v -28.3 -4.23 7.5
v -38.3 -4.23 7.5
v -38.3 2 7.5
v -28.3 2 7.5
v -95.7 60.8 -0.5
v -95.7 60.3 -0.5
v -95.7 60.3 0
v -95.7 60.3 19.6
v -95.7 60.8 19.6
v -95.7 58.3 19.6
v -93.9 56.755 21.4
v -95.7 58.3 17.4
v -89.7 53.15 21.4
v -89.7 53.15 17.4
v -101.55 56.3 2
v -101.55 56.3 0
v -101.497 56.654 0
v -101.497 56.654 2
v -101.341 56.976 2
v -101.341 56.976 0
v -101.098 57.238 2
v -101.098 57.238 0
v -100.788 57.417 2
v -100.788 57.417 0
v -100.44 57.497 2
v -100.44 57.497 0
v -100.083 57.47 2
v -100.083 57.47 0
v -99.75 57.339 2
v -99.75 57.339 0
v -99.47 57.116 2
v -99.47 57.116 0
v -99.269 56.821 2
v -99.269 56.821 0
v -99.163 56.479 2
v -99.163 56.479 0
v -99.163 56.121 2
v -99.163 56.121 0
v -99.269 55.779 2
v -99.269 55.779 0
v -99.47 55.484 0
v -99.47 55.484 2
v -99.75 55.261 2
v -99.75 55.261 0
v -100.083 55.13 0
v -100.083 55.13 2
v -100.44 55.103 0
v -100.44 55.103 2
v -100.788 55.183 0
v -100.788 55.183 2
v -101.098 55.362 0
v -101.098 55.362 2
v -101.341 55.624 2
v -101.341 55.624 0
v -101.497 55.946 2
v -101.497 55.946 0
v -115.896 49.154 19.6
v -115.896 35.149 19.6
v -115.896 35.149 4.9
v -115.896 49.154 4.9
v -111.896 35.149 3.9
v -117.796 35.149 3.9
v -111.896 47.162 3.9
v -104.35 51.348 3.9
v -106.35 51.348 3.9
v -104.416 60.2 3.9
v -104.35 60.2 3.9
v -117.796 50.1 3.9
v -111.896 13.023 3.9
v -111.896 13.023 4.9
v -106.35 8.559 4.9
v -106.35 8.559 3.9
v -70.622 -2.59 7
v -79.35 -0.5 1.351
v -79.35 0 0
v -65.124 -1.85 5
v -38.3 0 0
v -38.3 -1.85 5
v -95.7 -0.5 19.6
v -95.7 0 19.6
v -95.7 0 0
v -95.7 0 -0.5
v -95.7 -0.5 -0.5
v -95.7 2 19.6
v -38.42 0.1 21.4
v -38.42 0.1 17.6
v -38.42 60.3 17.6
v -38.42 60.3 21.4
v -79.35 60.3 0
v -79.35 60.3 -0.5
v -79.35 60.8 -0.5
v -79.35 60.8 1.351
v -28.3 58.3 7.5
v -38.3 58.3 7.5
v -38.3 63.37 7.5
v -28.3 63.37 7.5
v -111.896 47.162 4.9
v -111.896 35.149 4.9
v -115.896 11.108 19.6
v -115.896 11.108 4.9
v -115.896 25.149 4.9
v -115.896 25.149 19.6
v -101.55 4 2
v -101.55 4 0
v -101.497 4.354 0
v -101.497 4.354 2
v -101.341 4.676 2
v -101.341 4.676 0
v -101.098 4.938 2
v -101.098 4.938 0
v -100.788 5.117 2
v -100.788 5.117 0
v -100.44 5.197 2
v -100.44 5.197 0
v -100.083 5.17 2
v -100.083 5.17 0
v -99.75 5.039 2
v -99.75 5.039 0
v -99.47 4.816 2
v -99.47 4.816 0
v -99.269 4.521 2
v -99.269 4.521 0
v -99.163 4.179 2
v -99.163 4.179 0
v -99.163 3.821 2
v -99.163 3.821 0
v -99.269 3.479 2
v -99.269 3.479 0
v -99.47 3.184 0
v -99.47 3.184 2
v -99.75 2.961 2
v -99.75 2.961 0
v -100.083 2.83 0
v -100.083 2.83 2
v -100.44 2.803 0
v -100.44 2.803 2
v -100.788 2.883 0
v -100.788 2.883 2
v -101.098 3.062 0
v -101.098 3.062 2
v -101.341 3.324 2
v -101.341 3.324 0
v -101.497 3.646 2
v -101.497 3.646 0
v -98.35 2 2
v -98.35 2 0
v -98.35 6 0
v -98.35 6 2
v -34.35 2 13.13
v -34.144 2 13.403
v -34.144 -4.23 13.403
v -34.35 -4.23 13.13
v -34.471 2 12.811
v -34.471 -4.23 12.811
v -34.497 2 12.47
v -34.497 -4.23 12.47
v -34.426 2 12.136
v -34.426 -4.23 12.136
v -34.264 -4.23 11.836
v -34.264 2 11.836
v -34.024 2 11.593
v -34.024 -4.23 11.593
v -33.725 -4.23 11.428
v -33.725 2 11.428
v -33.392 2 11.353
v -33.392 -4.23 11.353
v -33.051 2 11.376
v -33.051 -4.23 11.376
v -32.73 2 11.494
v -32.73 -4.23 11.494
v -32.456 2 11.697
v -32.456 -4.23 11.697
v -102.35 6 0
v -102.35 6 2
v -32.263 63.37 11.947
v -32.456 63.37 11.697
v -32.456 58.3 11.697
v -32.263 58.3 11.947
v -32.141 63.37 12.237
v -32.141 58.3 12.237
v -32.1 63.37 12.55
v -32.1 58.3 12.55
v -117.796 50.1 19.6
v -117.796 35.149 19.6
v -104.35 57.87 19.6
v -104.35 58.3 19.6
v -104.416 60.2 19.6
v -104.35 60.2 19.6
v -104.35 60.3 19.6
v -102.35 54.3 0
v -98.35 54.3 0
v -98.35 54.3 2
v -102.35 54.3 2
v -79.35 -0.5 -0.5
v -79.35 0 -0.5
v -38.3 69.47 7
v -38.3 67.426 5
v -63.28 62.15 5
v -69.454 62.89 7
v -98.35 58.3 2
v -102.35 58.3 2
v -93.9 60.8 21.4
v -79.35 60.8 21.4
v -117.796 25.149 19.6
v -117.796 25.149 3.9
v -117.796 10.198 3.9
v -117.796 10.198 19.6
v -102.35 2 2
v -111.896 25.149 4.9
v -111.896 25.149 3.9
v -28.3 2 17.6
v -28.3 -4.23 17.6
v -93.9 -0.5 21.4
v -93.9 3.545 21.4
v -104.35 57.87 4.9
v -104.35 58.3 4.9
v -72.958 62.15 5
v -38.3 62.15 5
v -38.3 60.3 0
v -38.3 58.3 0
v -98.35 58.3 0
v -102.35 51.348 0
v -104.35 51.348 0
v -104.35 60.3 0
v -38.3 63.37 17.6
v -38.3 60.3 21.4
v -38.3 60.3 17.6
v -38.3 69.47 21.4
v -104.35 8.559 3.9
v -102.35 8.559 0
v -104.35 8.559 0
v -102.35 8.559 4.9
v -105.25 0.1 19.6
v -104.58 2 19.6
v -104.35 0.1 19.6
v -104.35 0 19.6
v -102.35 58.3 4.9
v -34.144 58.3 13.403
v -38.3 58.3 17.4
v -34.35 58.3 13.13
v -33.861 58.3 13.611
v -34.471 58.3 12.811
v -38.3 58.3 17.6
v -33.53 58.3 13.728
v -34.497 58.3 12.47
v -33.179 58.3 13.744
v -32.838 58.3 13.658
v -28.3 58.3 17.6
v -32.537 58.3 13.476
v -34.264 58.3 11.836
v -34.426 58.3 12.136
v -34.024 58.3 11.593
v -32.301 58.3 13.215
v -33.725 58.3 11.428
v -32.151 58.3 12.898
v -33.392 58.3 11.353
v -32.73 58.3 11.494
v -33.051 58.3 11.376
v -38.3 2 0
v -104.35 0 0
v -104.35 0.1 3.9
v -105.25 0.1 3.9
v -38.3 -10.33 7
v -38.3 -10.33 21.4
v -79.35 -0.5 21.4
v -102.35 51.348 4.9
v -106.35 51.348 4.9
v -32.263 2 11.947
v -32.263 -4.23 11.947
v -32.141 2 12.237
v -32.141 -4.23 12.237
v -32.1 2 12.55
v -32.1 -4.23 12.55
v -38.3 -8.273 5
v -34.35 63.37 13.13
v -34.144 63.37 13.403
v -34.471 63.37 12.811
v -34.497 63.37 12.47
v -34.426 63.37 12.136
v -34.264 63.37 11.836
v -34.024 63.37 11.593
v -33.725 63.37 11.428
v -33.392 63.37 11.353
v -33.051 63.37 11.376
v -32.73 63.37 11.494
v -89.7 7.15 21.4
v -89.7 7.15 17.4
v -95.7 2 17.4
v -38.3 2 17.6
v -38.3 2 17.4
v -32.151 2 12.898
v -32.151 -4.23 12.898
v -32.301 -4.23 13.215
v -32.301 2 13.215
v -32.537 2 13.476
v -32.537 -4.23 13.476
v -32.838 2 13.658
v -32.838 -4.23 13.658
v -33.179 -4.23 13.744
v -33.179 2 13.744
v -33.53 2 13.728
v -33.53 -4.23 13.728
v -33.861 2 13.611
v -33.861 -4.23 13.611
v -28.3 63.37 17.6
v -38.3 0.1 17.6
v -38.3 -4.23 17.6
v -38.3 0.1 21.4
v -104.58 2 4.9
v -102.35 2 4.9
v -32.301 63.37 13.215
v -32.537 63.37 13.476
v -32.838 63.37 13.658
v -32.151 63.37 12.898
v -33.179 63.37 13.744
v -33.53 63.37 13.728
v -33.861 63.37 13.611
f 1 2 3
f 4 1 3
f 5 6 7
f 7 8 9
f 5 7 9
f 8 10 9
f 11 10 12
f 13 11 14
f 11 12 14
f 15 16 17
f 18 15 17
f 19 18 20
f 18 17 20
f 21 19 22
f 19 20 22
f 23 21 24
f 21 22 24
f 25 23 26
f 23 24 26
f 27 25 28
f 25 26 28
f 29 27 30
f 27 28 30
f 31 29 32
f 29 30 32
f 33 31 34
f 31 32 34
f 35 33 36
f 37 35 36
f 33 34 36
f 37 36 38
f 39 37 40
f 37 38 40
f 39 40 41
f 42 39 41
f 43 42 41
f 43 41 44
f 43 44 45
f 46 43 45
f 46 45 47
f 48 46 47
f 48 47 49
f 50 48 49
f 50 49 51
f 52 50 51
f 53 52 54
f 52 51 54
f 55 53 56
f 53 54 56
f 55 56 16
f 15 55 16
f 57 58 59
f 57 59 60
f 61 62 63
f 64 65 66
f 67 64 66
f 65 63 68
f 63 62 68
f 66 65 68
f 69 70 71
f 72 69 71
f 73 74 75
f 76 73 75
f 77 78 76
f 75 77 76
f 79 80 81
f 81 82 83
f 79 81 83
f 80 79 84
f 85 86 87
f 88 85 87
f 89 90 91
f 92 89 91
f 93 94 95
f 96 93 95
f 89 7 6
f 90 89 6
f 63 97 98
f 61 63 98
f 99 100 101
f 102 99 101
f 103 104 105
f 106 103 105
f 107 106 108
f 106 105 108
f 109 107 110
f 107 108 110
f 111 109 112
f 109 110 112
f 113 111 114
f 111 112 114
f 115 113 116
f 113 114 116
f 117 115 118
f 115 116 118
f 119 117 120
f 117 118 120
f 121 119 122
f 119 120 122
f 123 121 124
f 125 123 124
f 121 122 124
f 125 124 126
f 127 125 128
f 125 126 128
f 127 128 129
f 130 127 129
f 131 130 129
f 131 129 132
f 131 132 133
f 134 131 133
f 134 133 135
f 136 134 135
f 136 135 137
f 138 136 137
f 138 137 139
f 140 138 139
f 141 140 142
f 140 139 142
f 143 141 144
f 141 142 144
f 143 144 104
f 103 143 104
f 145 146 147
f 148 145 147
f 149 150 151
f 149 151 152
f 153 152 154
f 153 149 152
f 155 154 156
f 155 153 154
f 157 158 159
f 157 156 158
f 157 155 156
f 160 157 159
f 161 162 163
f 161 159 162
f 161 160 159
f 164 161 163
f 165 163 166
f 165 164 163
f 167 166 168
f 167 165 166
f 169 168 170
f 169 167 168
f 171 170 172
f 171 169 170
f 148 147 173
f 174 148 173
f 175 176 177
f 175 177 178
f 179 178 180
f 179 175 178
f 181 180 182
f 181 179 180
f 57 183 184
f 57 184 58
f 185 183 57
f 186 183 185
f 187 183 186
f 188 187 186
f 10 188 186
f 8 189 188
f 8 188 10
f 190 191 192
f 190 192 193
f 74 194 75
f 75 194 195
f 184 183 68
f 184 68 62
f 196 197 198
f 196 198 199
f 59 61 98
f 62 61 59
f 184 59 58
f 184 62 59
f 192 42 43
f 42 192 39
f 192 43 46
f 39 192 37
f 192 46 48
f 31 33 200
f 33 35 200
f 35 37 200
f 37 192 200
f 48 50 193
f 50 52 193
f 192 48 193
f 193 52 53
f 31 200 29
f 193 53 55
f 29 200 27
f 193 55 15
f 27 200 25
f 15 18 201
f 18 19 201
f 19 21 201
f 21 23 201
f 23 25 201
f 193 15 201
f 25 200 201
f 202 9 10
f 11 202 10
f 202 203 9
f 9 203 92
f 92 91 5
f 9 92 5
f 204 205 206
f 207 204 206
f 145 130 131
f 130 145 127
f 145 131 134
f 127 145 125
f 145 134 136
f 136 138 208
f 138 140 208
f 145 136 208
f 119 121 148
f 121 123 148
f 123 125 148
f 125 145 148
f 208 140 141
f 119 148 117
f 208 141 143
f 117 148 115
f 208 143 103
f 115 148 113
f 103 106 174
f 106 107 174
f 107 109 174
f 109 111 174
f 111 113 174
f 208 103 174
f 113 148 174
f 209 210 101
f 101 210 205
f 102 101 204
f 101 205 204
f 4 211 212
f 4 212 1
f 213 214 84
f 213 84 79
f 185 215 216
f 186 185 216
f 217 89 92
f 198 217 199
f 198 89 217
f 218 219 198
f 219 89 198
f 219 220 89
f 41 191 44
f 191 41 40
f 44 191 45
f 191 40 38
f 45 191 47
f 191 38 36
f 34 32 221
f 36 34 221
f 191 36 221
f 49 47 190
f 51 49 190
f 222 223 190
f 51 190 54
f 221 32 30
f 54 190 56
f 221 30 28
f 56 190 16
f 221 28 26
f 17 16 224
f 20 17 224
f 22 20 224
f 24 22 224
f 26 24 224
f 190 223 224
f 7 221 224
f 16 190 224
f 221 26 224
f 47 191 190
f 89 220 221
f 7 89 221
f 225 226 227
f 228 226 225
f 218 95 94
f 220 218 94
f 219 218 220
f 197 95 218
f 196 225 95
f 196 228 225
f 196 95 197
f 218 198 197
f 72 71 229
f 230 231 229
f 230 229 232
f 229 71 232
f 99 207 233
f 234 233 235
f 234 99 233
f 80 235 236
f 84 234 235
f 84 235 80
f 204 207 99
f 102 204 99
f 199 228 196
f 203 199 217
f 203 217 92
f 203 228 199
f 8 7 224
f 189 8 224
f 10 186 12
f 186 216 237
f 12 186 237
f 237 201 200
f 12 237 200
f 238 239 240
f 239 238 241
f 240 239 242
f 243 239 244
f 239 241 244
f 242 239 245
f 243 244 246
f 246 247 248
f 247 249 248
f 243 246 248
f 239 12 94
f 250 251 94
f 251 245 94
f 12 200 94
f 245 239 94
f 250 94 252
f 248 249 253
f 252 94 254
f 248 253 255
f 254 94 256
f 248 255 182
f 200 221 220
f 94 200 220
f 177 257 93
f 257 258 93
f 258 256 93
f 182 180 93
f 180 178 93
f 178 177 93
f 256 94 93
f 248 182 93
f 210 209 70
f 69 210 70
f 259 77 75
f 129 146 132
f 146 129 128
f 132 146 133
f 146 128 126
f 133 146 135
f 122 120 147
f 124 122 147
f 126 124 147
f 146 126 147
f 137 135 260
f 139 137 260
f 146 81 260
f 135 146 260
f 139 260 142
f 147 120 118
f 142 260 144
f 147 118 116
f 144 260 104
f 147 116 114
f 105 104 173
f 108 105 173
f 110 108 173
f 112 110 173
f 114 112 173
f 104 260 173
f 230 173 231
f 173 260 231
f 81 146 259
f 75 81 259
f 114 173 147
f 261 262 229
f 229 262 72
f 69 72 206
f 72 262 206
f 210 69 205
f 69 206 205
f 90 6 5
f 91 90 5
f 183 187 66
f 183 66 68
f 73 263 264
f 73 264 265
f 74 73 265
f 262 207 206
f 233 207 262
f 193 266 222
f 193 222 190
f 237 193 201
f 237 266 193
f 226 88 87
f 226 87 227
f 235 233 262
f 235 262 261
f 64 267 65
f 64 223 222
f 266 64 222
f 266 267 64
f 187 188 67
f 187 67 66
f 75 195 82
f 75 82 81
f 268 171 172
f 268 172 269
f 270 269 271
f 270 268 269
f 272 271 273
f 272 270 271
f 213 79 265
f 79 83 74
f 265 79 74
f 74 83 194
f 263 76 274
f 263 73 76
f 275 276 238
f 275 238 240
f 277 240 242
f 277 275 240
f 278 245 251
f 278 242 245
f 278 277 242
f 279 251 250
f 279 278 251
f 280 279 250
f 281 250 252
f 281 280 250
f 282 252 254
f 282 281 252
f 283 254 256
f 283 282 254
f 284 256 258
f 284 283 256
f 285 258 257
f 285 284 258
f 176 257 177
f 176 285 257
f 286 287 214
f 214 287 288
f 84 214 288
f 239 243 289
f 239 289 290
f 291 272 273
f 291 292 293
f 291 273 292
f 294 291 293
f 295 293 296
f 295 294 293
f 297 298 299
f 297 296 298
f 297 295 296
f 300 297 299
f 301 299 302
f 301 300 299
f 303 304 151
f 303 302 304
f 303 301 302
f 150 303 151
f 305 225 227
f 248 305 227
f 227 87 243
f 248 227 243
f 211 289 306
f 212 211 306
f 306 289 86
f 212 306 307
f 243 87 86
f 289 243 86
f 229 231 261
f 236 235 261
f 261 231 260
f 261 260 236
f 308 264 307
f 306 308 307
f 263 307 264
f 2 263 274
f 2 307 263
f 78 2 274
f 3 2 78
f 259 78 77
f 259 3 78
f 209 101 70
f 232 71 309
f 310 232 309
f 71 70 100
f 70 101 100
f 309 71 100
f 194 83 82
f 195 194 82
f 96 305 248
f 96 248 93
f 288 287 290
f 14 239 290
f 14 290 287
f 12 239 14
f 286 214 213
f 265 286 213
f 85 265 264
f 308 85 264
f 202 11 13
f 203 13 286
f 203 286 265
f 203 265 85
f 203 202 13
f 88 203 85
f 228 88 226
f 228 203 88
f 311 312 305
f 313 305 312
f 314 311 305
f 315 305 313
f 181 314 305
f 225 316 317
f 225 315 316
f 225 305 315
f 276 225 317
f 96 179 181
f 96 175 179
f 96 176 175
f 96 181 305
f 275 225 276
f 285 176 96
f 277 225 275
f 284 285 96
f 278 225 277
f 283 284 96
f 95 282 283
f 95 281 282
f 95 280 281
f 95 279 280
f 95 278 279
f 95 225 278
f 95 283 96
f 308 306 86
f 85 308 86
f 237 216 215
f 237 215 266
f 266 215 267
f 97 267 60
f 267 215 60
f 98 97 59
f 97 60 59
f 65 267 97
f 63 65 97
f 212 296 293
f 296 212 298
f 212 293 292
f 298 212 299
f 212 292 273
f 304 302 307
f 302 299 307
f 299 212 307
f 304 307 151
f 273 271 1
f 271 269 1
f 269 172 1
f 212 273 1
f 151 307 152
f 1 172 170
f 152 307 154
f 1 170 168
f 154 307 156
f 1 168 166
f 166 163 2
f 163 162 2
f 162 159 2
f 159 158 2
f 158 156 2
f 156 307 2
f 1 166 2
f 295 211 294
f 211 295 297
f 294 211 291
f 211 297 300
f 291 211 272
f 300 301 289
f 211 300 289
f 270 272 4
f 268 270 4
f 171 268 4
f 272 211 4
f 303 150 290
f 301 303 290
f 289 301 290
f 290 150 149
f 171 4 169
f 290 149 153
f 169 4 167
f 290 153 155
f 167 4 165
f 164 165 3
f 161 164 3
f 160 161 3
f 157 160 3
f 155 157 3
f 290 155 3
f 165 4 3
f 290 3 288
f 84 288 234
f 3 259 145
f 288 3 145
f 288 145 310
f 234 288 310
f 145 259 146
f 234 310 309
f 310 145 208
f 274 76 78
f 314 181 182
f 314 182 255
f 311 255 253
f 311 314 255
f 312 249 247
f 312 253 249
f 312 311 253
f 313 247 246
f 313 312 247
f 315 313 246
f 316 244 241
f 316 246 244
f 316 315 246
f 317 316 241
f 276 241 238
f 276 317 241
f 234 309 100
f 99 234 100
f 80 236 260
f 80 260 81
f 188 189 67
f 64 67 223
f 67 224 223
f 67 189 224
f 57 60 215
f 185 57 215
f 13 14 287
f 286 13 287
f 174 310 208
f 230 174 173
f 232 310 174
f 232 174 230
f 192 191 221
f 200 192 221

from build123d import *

# Parameters (mm, degrees)
SKETCH_2_W               = 25
SKETCH_2_H               = 2
EXTRUDE_1_DEPTH          = 15
EXTRUDE_1_2_DEPTH        = 15
EXTRUDE_2_DEPTH          = 2.6
EXTRUDE_3_DEPTH          = 15.7
EXTRUDE_4_DEPTH          = 1
EXTRUDE_5_DEPTH          = 2
SKETCH_7_W               = 2
SKETCH_7_H               = 56.3
EXTRUDE_6_DEPTH          = 3.9
SKETCH_8_W               = 4
SKETCH_8_H               = 4
SKETCH_8_R               = 1.2
EXTRUDE_7_DEPTH          = 2
EXTRUDE_START            = -16.35
EXTRUDE_8_DEPTH          = 16.35
CUT_EXTRUDE_1_DEPTH      = 2.6
EXTRUDE_9_DEPTH          = 41.05
SKETCH_12_W              = 10.1
SKETCH_12_H              = 3.07
EXTRUDE_10_DEPTH         = 10
CUT_EXTRUDE_2_DEPTH      = 135.796311397
CUT_EXTRUDE_2_DEPTH_BACK = 135.796311397
EXTRUDE_11_DEPTH         = 3.8
SKETCH_15_W              = 8.65
SKETCH_15_H              = 2
CUT_EXTRUDE_3_DEPTH      = 1.8
CUT_EXTRUDE_4_DEPTH      = 2.4
EXTRUDE_12_DEPTH         = 16.399999999
EXTRUDE_13_REACH         = 109.72
EXTRUDE_14_REACH         = 109.72
CHAMFER_1_SIZE           = 2
CHAMFER_3_SIZE           = 1.8
SKETCH_20_W              = 4
SKETCH_20_H              = 42.789151816
CUT_EXTRUDE_5_DEPTH      = 10
SKETCH_21_W              = 15.7
SKETCH_21_H              = 10
CUT_EXTRUDE_6_DEPTH      = 10


with BuildPart() as part:
    # 草图2 → 凸台-拉伸1 (new body)
    with BuildSketch(Plane.XY):
        with Locations((-91.85, 1)):
            Rectangle(SKETCH_2_W, SKETCH_2_H)
    extrude(amount=EXTRUDE_1_DEPTH)



with BuildPart() as body_2:
    # 草图2 → Extrude 1 2 (new body)
    with BuildSketch(Plane.XY):
        with Locations((-91.85, 59.3)):
            Rectangle(SKETCH_2_W, SKETCH_2_H)
    extrude(amount=EXTRUDE_1_2_DEPTH)


with BuildPart() as part_1:
    add(part.part)

    add(body_2.part)  # 凸台-拉伸2 merges body 2
    # 草图3 → 凸台-拉伸2 (add)
    with BuildSketch(Plane.XY.offset(15)):
        Polygon((-95.7, 2), (-104.35, 2), (-104.35, 0), (-79.35, 0), (-79.35, 60.3), (-104.35, 60.3), (-104.35, 58.3), (-95.7, 58.3), align=None)
    extrude(amount=EXTRUDE_2_DEPTH)

    # 草图4 → 凸台-拉伸3 (add)
    with BuildSketch(Plane.XY.offset(19.6)):
        Polygon((-104.35, 2), (-104.580416833, 2), (-115.895945033, 11.107600771), (-115.895945033, 49.153887402), (-104.35, 57.869625998), (-104.35, 58.3), (-104.35, 60.2), (-104.416493669, 60.2), (-117.795945033, 50.10019437), (-117.795945033, 10.197880039), (-105.250067231, 0.1), (-104.35, 0.1), align=None)
    extrude(amount=-EXTRUDE_3_DEPTH)

    # 草图5 → 凸台-拉伸4 (add)
    with BuildSketch(Plane(origin=(0, 0, 3.9), x_dir=(-1, 0, 0), z_dir=(0, 0, -1))):
        Polygon((104.35, 2), (104.35, 57.869625998), (115.895945033, 49.153887402), (115.895945033, 11.107600771), (104.580416833, 2), align=None)
    extrude(amount=-EXTRUDE_4_DEPTH)

    # 草图6 → 凸台-拉伸5 (add)
    with BuildSketch(Plane(origin=(-104.35, 0, 0), x_dir=(0, 0, -1), z_dir=(1, 0, 0))):
        Polygon((-4.9, 58.3), (-4.9, 57.869625998), (-4.9, 2), (-3.9, 2), (-3.9, 58.3), align=None)
    extrude(amount=EXTRUDE_5_DEPTH)

    # 草图7 → 凸台-拉伸6 (add)
    with BuildSketch(Plane(origin=(0, 0, 3.9), x_dir=(-1, 0, 0), z_dir=(0, 0, -1))):
        with Locations((103.35, 30.15)):
            Rectangle(SKETCH_7_W, SKETCH_7_H)
    extrude(amount=EXTRUDE_6_DEPTH)

    # 草图8 → 凸台-拉伸7 (add)
    # profile 1 of 2: a face of its own
    with BuildSketch(Plane(origin=(0, 0, 0), x_dir=(-1, 0, 0), z_dir=(0, 0, -1))):
        with Locations((100.35, 56.3)):
            Rectangle(SKETCH_8_W, SKETCH_8_H)
        with Locations((100.35, 56.3)):
            Circle(SKETCH_8_R, mode=Mode.SUBTRACT)
    # profile 2 of 2: a face of its own
    with BuildSketch(Plane(origin=(0, 0, 0), x_dir=(-1, 0, 0), z_dir=(0, 0, -1))):
        with Locations((100.35, 4)):
            Rectangle(SKETCH_8_W, SKETCH_8_H)
        with Locations((100.35, 4)):
            Circle(SKETCH_8_R, mode=Mode.SUBTRACT)
    extrude(amount=-EXTRUDE_7_DEPTH)

    # 草图9 → 凸台-拉伸8 (add)
    with BuildSketch(Plane(origin=(-79.35, 0, 0), x_dir=(0, 0, -1), z_dir=(1, 0, 0)).offset(EXTRUDE_START)):
        Polygon((-17.6, 0), (-17.6, -0.5), (0.5, -0.5), (0.5, 0), (0, 0), align=None)
        Polygon((-17.6, 60.8), (-17.6, 60.3), (0, 60.3), (0.5, 60.3), (0.5, 60.8), align=None)
    extrude(amount=EXTRUDE_8_DEPTH)

    # 草图10 → 切除-拉伸1 (cut)
    with BuildSketch(Plane.XY.offset(17.6)):
        Polygon((-95.7, 58.3), (-89.7, 53.15), (-89.7, 7.15), (-95.7, 2), align=None)
    extrude(amount=-CUT_EXTRUDE_1_DEPTH, mode=Mode.SUBTRACT)

    # 草图11 → 凸台-拉伸9 (add)
    with BuildSketch(Plane(origin=(-79.35, 0, 0), x_dir=(0, 0, -1), z_dir=(1, 0, 0))):
        Polygon((-17.6, 0.1), (0, 0), (0, 2), (-15, 2), (-15, 58.3), (0, 58.3), (0, 60.3), (-17.6, 60.3), align=None)
    extrude(amount=EXTRUDE_9_DEPTH)

    # 草图12 → 凸台-拉伸10 (add)
    with BuildSketch(Plane(origin=(-38.3, 0, 0), x_dir=(0, 0, -1), z_dir=(1, 0, 0))):
        Polygon((-7.5, 0.042613636), (-7.5, 2), (-15, 2), (-17.6, 2), (-17.6, 0.1), align=None)
        Polygon((-7.5, -4.23), (-7.5, 0.042613636), (-17.6, 0.1), (-17.6, -4.23), align=None)
        with Locations((-12.55, 61.835)):
            Rectangle(SKETCH_12_W, SKETCH_12_H)
        Polygon((-15, 58.3), (-7.5, 58.3), (-7.5, 60.3), (-17.6, 60.3), (-17.6, 58.3), align=None)
    extrude(amount=EXTRUDE_10_DEPTH)

    # 草图13 → 切除-拉伸2 (cut, two sides: drawn at the far end of the back side and taken through both)
    with BuildSketch(Plane.XZ.offset(-58.3).offset(-CUT_EXTRUDE_2_DEPTH_BACK)):
        with BuildLine():
            ThreePointArc((-32.1, 12.55), (-32.838023478, 13.657509681), (-34.144296155, 13.402739117))
            Line((-34.144296155, 13.402739117), (-32.455703844, 11.697260883))
            ThreePointArc((-32.455703844, 11.697260883), (-32.192490319, 12.088023478), (-32.1, 12.55))
        make_face()
        with BuildLine():
            Line((-32.455703844, 11.697260883), (-34.144296155, 13.402739117))
            ThreePointArc((-34.144296155, 13.402739117), (-34.152739117, 11.705703844), (-32.455703844, 11.697260883))
        make_face()
    extrude(amount=CUT_EXTRUDE_2_DEPTH + CUT_EXTRUDE_2_DEPTH_BACK, mode=Mode.SUBTRACT)

    # 草图14 → 凸台-拉伸11 (add)
    with BuildSketch(Plane.XY.offset(17.6)):
        Polygon((-79.35, 0.1), (-38.42, 0.1), (-38.42, 2), (-38.42, 58.3), (-38.42, 60.3), (-79.35, 60.3), (-79.35, 60.8), (-95.7, 60.8), (-95.7, 60.3), (-104.35, 60.3), (-104.35, 60.2), (-104.35, 58.3), (-95.7, 58.3), (-89.7, 53.15), (-89.7, 7.15), (-95.7, 2), (-104.35, 2), (-104.35, 0.1), (-104.35, 0), (-95.7, 0), (-95.7, -0.5), (-79.35, -0.5), align=None)
    extrude(amount=EXTRUDE_11_DEPTH)

    # 草图15 → 切除-拉伸3 (cut)
    with BuildSketch(Plane.XY.offset(21.4)):
        with Locations((-100.025, 59.3)):
            Rectangle(SKETCH_15_W, SKETCH_15_H)
        with Locations((-100.025, 1)):
            Rectangle(SKETCH_15_W, SKETCH_15_H)
    extrude(amount=-CUT_EXTRUDE_3_DEPTH, mode=Mode.SUBTRACT)

    # 草图16 → 切除-拉伸4 (cut)
    with BuildSketch(Plane(origin=(0, 0, 15), x_dir=(-1, 0, 0), z_dir=(0, 0, -1))):
        Polygon((89.7, 53.15), (95.7, 58.3), (38.3, 58.3), (38.3, 2), (95.7, 2), (89.7, 7.15), align=None)
    extrude(amount=-CUT_EXTRUDE_4_DEPTH, mode=Mode.SUBTRACT)

    # 草图17 → 凸台-拉伸12 (add)
    with BuildSketch(Plane.XY.offset(21.4)):
        Polygon((-38.42, 60.3), (-38.3, 60.3), (-38.3, 69.47), (-79.35, 60.8), (-79.35, 60.3), align=None)
        Polygon((-79.35, -0.5), (-38.3, -10.33), (-38.3, 0.1), (-38.42, 0.1), (-79.35, 0.1), align=None)
    extrude(amount=-EXTRUDE_12_DEPTH)

    # 凸台-拉伸13: up to this plane
    extrude_13_end = Plane(origin=(-15.681436973, 74.247172751, -37.354307927), z_dir=(0.20664708387422698, -0.9784155470587527, 0))
    # 草图18 → 凸台-拉伸13 (add, up to the surface)
    with BuildSketch(Plane(origin=(-38.3, 0, 0), x_dir=(0, 0, -1), z_dir=(1, 0, 0)), mode=Mode.PRIVATE) as extrude_13_sk1:
        Polygon((-5.000000001, 60.3), (0, 60.3), (-5, 62.15), align=None)
    extrude_13_tool1 = split(extrude(extrude_13_sk1.sketch, amount=-EXTRUDE_13_REACH, mode=Mode.PRIVATE), bisect_by=extrude_13_end, keep=Keep.BOTH, mode=Mode.PRIVATE)
    add(extrude_13_tool1.solids().sort_by_distance((-38.3, 60.916667, 3.333333))[0])

    # 凸台-拉伸14: up to this plane
    extrude_14_end = Plane(origin=(-4.416638762, -18.443847527, -37.354307927), z_dir=(-0.23288011181129656, -0.9725054516673715, 0))
    # 草图19 → 凸台-拉伸14 (add, up to the surface)
    with BuildSketch(Plane(origin=(-38.3, 0, 0), x_dir=(0, 0, -1), z_dir=(1, 0, 0)), mode=Mode.PRIVATE) as extrude_14_sk1:
        Polygon((-5, -1.85), (0, 0), (-5, 0.028409091), align=None)
    extrude_14_tool1 = split(extrude(extrude_14_sk1.sketch, amount=-EXTRUDE_14_REACH, mode=Mode.PRIVATE), bisect_by=extrude_14_end, keep=Keep.BOTH, mode=Mode.PRIVATE)
    add(extrude_14_tool1.solids().sort_by_distance((-38.3, -0.607197, 3.333333))[0])

    # 倒角1
    chamfer_1_edges = [part_1.edges().sort_by_distance(p)[0] for p in [
        (-55.629065744, 65.81, 5.000000001),
        (-56.006205493, -6.09, 5.000000001),
    ]]
    chamfer(chamfer_1_edges, length=CHAMFER_1_SIZE)

    # 倒角3
    chamfer_3_edges = [part_1.edges().sort_by_distance(p)[0] for p in [
        (-95.7, 59.55, 21.4),
        (-95.7, 0.75, 21.4),
    ]]
    chamfer(chamfer_3_edges, length=CHAMFER_3_SIZE - 0.0001)  # a hair under: the kernel refuses the full size

    # 草图20 → 切除-拉伸5 (cut)
    with BuildSketch(Plane.XY.offset(4.9)):
        Polygon((-106.35, 8.559002447), (-106.35, 51.348154263), (-111.895945033, 47.161662205), (-111.895945033, 13.022802313), align=None)
        with Locations((-104.35, 29.953578355)):
            Rectangle(SKETCH_20_W, SKETCH_20_H)
    extrude(amount=-CUT_EXTRUDE_5_DEPTH, mode=Mode.SUBTRACT)

    # 草图21 → 切除-拉伸6 (cut)
    with BuildSketch(Plane.ZY.offset(117.795945033)):
        with Locations((11.75, 30.149037204)):
            Rectangle(SKETCH_21_W, SKETCH_21_H)
    extrude(amount=-CUT_EXTRUDE_6_DEPTH, mode=Mode.SUBTRACT)


solid = part_1.part
